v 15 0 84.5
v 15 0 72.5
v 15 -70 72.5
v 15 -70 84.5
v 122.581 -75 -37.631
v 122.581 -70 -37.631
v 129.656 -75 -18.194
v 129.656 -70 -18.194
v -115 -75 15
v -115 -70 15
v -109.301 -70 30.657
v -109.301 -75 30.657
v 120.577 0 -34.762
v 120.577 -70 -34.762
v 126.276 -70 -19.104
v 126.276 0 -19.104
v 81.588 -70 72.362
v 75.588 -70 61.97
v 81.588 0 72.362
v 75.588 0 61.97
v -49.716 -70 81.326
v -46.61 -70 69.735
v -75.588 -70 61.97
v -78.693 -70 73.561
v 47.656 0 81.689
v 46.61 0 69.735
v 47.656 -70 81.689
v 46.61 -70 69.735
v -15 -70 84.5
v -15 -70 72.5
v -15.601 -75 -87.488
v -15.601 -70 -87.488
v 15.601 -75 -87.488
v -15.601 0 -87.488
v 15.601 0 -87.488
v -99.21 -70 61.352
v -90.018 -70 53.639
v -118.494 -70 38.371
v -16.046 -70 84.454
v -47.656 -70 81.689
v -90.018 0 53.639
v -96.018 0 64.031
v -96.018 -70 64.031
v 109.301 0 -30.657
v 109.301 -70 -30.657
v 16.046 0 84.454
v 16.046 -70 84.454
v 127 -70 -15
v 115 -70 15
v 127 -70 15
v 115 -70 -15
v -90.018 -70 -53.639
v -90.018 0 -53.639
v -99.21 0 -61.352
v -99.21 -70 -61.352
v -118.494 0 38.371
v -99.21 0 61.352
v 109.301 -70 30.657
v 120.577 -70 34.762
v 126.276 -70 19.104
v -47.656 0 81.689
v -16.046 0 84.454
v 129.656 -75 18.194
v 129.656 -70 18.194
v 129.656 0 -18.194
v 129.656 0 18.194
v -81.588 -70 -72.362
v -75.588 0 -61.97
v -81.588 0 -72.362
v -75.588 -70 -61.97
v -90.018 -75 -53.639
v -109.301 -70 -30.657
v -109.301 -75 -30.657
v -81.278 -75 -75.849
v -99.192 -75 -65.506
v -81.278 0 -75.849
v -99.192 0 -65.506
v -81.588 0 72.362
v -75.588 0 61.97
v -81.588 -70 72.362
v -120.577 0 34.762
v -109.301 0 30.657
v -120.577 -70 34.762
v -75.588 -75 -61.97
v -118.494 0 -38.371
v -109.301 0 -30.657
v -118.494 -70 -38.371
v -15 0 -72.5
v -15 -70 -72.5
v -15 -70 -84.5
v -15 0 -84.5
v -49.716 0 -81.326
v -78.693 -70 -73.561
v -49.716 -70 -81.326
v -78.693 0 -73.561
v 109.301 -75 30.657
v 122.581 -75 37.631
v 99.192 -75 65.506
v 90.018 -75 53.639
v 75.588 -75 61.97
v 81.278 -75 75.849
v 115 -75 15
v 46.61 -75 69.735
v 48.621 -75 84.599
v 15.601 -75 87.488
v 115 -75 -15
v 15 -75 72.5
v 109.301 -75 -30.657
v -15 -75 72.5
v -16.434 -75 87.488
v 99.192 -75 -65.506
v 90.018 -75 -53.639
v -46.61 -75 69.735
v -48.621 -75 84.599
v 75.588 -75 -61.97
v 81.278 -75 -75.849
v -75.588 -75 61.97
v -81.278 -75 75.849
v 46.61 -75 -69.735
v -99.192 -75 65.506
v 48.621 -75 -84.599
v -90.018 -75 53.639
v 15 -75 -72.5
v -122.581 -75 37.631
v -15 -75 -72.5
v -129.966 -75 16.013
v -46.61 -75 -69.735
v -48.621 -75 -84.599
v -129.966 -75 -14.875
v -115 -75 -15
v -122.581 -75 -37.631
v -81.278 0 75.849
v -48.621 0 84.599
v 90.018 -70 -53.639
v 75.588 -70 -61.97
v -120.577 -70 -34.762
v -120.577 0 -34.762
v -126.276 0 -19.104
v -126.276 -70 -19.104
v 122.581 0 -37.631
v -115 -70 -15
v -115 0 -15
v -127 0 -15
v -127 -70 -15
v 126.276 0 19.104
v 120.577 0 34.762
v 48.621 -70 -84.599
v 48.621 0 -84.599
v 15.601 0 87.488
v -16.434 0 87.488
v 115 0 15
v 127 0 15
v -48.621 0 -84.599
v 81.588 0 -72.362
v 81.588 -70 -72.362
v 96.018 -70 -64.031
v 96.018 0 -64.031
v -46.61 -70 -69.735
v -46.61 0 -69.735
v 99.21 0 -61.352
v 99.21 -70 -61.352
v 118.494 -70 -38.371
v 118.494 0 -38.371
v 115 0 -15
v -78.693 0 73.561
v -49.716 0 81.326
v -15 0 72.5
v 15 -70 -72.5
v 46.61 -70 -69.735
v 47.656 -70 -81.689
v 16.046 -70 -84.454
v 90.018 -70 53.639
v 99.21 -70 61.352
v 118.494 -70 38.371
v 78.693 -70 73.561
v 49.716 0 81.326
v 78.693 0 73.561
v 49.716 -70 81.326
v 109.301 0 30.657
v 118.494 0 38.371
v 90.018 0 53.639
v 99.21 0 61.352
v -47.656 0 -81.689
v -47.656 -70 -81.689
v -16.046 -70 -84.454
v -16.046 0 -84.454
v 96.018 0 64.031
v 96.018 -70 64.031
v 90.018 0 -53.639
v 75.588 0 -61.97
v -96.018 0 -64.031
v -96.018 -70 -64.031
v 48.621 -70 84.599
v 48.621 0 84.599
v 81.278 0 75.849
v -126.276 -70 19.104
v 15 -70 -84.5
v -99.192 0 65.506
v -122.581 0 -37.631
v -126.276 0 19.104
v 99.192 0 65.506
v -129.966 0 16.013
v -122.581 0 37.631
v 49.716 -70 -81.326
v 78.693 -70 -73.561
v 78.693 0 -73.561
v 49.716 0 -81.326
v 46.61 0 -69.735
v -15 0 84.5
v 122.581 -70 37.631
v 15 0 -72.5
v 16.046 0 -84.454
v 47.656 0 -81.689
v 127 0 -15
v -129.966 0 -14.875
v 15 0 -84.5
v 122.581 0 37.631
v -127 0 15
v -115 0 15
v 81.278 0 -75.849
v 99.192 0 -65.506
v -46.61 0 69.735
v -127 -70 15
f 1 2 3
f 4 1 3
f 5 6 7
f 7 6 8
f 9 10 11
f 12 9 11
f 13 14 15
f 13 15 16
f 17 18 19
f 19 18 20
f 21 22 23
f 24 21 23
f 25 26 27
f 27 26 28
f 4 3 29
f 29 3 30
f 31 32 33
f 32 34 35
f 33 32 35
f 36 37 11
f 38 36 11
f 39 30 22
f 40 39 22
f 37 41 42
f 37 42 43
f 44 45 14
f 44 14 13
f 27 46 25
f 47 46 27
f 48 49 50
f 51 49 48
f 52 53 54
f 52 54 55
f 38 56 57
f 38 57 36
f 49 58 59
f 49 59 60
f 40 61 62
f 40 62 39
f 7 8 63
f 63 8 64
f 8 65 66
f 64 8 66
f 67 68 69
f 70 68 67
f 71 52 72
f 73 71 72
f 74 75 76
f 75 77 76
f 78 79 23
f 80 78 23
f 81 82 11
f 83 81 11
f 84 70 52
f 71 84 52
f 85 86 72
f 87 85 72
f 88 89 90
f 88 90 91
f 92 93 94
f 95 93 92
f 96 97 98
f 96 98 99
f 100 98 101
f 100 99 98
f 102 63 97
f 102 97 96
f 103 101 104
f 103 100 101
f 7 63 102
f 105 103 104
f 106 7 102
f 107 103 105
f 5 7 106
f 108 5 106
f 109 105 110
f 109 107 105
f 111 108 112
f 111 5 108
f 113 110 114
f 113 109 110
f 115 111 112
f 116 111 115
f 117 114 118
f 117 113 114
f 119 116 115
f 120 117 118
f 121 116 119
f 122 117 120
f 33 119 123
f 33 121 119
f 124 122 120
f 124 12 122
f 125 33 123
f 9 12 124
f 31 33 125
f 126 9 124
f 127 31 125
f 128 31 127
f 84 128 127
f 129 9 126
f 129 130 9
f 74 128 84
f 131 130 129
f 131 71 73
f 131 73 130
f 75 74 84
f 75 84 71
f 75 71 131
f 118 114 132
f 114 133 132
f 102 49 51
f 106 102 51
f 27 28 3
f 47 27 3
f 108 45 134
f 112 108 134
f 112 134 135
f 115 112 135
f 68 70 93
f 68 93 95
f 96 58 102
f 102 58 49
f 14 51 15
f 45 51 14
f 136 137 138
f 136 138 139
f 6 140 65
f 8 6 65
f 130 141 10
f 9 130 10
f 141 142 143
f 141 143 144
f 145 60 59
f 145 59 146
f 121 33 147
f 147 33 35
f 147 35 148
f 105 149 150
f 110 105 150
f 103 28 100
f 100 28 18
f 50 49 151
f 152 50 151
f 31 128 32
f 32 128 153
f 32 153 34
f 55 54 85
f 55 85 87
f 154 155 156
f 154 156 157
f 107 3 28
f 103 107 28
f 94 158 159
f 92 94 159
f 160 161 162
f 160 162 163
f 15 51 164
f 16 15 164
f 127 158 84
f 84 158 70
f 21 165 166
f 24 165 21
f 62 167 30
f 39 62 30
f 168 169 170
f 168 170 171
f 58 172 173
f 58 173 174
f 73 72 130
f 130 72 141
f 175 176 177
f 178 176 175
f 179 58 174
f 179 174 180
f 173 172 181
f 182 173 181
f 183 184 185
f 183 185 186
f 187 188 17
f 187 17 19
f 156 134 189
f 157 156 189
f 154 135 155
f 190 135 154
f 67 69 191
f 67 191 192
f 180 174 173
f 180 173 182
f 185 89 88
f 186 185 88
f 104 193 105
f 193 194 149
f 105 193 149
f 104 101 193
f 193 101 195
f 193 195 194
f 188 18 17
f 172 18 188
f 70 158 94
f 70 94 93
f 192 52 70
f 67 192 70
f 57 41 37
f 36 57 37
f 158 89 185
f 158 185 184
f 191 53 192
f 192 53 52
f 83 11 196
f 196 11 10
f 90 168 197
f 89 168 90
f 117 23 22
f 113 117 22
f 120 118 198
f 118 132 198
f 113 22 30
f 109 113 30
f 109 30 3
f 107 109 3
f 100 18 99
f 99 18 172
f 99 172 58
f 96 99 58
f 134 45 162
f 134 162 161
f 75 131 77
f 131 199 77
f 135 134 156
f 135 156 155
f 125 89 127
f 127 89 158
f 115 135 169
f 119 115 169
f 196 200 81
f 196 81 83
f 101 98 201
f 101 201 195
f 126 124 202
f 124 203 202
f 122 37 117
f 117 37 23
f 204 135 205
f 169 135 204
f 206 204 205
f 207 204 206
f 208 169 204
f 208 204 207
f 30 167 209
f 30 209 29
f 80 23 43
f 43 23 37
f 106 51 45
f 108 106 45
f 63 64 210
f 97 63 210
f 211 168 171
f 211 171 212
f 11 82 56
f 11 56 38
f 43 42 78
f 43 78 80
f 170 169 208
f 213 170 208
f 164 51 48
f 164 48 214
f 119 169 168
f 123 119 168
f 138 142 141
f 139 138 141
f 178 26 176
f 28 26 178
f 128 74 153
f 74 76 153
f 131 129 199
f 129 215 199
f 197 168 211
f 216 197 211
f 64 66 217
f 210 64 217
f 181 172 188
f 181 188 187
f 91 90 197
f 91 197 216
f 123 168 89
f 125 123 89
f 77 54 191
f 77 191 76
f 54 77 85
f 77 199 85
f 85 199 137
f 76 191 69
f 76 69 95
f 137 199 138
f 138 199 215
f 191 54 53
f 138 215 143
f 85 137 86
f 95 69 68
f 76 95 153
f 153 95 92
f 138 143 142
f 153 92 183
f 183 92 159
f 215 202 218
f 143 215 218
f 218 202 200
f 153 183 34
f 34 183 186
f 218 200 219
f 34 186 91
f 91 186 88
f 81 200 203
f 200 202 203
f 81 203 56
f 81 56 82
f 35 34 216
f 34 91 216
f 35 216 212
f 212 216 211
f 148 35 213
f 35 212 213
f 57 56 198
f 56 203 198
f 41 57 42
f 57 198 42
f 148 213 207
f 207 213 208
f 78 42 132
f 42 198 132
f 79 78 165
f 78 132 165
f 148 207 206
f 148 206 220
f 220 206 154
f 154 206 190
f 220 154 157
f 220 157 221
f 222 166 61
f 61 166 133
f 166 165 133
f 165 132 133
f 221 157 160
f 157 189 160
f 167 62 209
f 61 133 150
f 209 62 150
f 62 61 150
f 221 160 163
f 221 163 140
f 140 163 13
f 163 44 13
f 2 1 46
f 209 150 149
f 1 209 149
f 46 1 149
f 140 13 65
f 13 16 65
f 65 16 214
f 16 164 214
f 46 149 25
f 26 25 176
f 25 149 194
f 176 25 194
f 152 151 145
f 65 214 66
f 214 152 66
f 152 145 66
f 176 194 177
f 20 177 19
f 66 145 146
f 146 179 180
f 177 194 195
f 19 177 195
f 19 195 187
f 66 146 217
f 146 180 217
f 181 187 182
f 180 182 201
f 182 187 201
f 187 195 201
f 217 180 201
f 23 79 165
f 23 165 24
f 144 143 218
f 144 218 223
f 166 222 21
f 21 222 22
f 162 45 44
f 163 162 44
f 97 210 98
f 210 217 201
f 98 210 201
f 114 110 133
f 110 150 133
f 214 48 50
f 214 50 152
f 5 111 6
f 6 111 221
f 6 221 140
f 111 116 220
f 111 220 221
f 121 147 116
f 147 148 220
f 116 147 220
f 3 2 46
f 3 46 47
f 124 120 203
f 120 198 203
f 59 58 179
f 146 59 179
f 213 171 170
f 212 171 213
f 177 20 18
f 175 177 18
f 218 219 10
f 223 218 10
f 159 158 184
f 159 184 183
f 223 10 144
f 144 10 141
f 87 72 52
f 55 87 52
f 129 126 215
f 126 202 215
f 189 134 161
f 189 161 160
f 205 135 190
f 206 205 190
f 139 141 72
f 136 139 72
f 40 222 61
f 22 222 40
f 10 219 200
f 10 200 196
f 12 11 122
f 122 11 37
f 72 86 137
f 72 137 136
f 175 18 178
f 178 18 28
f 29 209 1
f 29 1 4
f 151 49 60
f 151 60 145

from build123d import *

# Parameters (mm, degrees)
PAD_DEPTH          = 70
PAD001_DEPTH       = 5
PAD001_FACE43_W    = 70
PAD001_FACE43_H    = 30
POCKET_DEPTH       = 12
POCKET_FACE41_W    = 70
POCKET_FACE41_H    = 31.7305168913
POCKET001_DEPTH    = 12
POCKET001_FACE44_W = 70
POCKET001_FACE44_H = 30
POCKET002_DEPTH    = 12
POCKET002_FACE47_W = 70
POCKET002_FACE47_H = 31.7305168913
POCKET003_DEPTH    = 12
POCKET003_FACE37_W = 70
POCKET003_FACE37_H = 16.6623057169
POCKET004_DEPTH    = 12
POCKET004_FACE36_W = 70
POCKET004_FACE36_H = 30
POCKET005_DEPTH    = 12
POCKET005_FACE35_W = 70
POCKET005_FACE35_H = 16.6623057169
POCKET006_DEPTH    = 12
POCKET006_FACE34_W = 70
POCKET006_FACE34_H = 30
POCKET007_DEPTH    = 12
POCKET007_FACE33_W = 70
POCKET007_FACE33_H = 16.6623057169
POCKET008_DEPTH    = 12
POCKET008_FACE60_W = 70
POCKET008_FACE60_H = 30
POCKET009_DEPTH    = 12
POCKET009_FACE63_W = 70
POCKET009_FACE63_H = 16.6623057169
POCKET010_DEPTH    = 12
POCKET010_FACE66_W = 70
POCKET010_FACE66_H = 30
POCKET011_DEPTH    = 12
POCKET011_FACE69_W = 70
POCKET011_FACE69_H = 16.6623057169
POCKET012_DEPTH    = 12
POCKET012_FACE72_W = 70
POCKET012_FACE72_H = 30
POCKET013_DEPTH    = 12
POCKET013_FACE75_W = 70
POCKET013_FACE75_H = 16.6623057169
POCKET014_DEPTH    = 12
POCKET014_FACE78_W = 70
POCKET014_FACE78_H = 30
POCKET015_DEPTH    = 12
POCKET015_FACE81_W = 70
POCKET015_FACE81_H = 16.6623057169
POCKET016_DEPTH    = 12
POCKET016_FACE84_W = 70
POCKET016_FACE84_H = 30
POCKET017_DEPTH    = 12
POCKET017_FACE87_W = 70
POCKET017_FACE87_H = 31.7305168913
POCKET018_DEPTH    = 12
POCKET018_FACE32_W = 70
POCKET018_FACE32_H = 30
POCKET019_DEPTH    = 12
POCKET019_FACE31_W = 70
POCKET019_FACE31_H = 16.6623057169
POCKET020_DEPTH    = 12
POCKET020_FACE30_W = 70
POCKET020_FACE30_H = 30
POCKET021_DEPTH    = 12
POCKET021_FACE29_W = 70
POCKET021_FACE29_H = 31.7305168913
POCKET022_DEPTH    = 12
POCKET022_FACE98_W = 70
POCKET022_FACE98_H = 30
POCKET023_DEPTH    = 12


with BuildPart() as part:
    # Sketch → Pad (new body)
    with BuildSketch(Plane.XZ):
        Polygon((15.6005336184, 87.4879738248), (-16.433599, 87.4879738248), (-48.6209968735, 84.5990576256), (-81.2780534486, 75.8486256891), (-99.1915759479, 65.506248652), (-122.5813887031, 37.6313552709), (-129.9657652325, 16.0128529043), (-129.9657652325, -14.874853), (-122.5813887031, -37.6313552709), (-99.1915759479, -65.506248652), (-81.2780534486, -75.8486256891), (-48.6209968735, -84.5990576256), (-15.6005336184, -87.4879738248), (15.6005336184, -87.4879738248), (48.6209968735, -84.5990576256), (81.2780534486, -75.8486256891), (99.1915759479, -65.506248652), (122.5813887031, -37.6313552709), (129.6559912563, -18.1940445045), (129.6559912563, 18.1940445045), (122.5813887031, 37.6313552709), (99.1915759479, 65.506248652), (81.2780534486, 75.8486256891), (48.6209968735, 84.5990576256), align=None)
        Polygon((-115, 15), (-115, -15), (-109.3011558106, -30.6574457275), (-90.01752752, -53.638779021), (-75.5875474835, -61.9699318795), (-46.6097726948, -69.7345032326), (-15, -72.5), (15, -72.5), (46.6097726948, -69.7345032326), (75.5875474835, -61.9699318795), (90.01752752, -53.638779021), (109.3011558106, -30.6574457275), (115, -15), (115, 15), (109.3011558106, 30.6574457275), (90.01752752, 53.638779021), (75.5875474835, 61.9699318795), (46.6097726948, 69.7345032326), (15, 72.5), (-15, 72.5), (-46.6097726948, 69.7345032326), (-75.5875474835, 61.9699318795), (-90.01752752, 53.638779021), (-109.3011558106, 30.6574457275), align=None, mode=Mode.SUBTRACT)
    extrude(amount=PAD_DEPTH)

    # Pad Face50 → Pad001 (add)
    with BuildSketch(Plane(origin=(0.0330089745, -70, 0.0202146999), x_dir=(-1, 0, 0), z_dir=(0, -1, 0))):
        Polygon((-15.5675246439, -87.4677591249), (16.4666079745, -87.4677591249), (48.654005848, -84.5788429257), (81.3110624231, -75.8284109892), (99.2245849224, -65.4860339521), (122.6143976776, -37.611140571), (129.998774207, -15.9926382044), (129.998774207, 14.8950676999), (122.6143976776, 37.6515699708), (99.2245849224, 65.5264633519), (81.3110624231, 75.868840389), (48.654005848, 84.6192723255), (15.633542593, 87.5081885247), (-15.5675246439, 87.5081885247), (-48.5879878989, 84.6192723255), (-81.2450444741, 75.868840389), (-99.1585669734, 65.5264633519), (-122.5483797286, 37.6515699708), (-129.6229822817, 18.2142592044), (-129.6229822817, -18.1738298046), (-122.5483797286, -37.611140571), (-99.1585669734, -65.4860339521), (-81.2450444741, -75.8284109892), (-48.5879878989, -84.5788429257), align=None)
        Polygon((15.0330089745, -72.4797853001), (-14.9669910255, -72.4797853001), (-46.5767637203, -69.7142885327), (-75.554538509, -61.9497171796), (-89.9845185454, -53.6185643211), (-109.268146836, -30.6372310276), (-114.9669910255, -14.9797853001), (-114.9669910255, 15.0202146999), (-109.268146836, 30.6776604274), (-89.9845185454, 53.6589937209), (-75.554538509, 61.9901465794), (-46.5767637203, 69.7547179325), (-14.9669910255, 72.5202146999), (15.0330089745, 72.5202146999), (46.6427816693, 69.7547179325), (75.620556458, 61.9901465794), (90.0505364945, 53.6589937209), (109.3341647851, 30.6776604274), (115.0330089745, 15.0202146999), (115.0330089745, -14.9797853001), (109.3341647851, -30.6372310276), (90.0505364945, -53.6185643211), (75.620556458, -61.9497171796), (46.6427816693, -69.7142885327), align=None, mode=Mode.SUBTRACT)
    extrude(amount=PAD001_DEPTH)

    # Pad001 Face43 → Pocket (cut)
    with BuildSketch(Plane(origin=(-61.0986600892, -35, -65.852217556), x_dir=(0, 1, 0), z_dir=(0.2588190451, 0, 0.9659258263))):
        Rectangle(PAD001_FACE43_W, PAD001_FACE43_H)
    extrude(amount=-POCKET_DEPTH, mode=Mode.SUBTRACT)

    # Pocket Face41 → Pocket001 (cut)
    with BuildSketch(Plane(origin=(-30.8048863474, -35, -71.1172516163), x_dir=(0, 1, 0), z_dir=(0.0871557427, 0, 0.9961946981))):
        Rectangle(POCKET_FACE41_W, POCKET_FACE41_H)
    extrude(amount=-POCKET001_DEPTH, mode=Mode.SUBTRACT)

    # Pocket001 Face44 → Pocket002 (cut)
    with BuildSketch(Plane(origin=(0, -35, -72.5), x_dir=(0, 1, 0), z_dir=(0, 0, 1))):
        Rectangle(POCKET001_FACE44_W, POCKET001_FACE44_H)
    extrude(amount=-POCKET002_DEPTH, mode=Mode.SUBTRACT)

    # Pocket002 Face47 → Pocket003 (cut)
    with BuildSketch(Plane(origin=(30.8048863474, -35, -71.1172516163), x_dir=(0, 1, 0), z_dir=(-0.0871557427, 0, 0.9961946981))):
        Rectangle(POCKET002_FACE47_W, POCKET002_FACE47_H)
    extrude(amount=-POCKET003_DEPTH, mode=Mode.SUBTRACT)

    # Pocket003 Face37 → Pocket004 (cut)
    with BuildSketch(Plane(origin=(-82.8025375017, -35, -57.8043554503), x_dir=(0, -1, 0), z_dir=(0.5, 0, 0.8660254038))):
        Rectangle(POCKET003_FACE37_W, POCKET003_FACE37_H)
    extrude(amount=-POCKET004_DEPTH, mode=Mode.SUBTRACT)

    # Pocket004 Face36 → Pocket005 (cut)
    with BuildSketch(Plane(origin=(-99.6593416653, -35, -42.1481123743), x_dir=(0, -1, 0), z_dir=(0.7660444431, 0, 0.6427876097))):
        Rectangle(POCKET004_FACE36_W, POCKET004_FACE36_H)
    extrude(amount=-POCKET005_DEPTH, mode=Mode.SUBTRACT)

    # Pocket005 Face35 → Pocket006 (cut)
    with BuildSketch(Plane(origin=(-112.1505779053, -35, -22.8287228637), x_dir=(0, -1, 0), z_dir=(0.9396926208, 0, 0.3420201433))):
        Rectangle(POCKET005_FACE35_W, POCKET005_FACE35_H)
    extrude(amount=-POCKET006_DEPTH, mode=Mode.SUBTRACT)

    # Pocket006 Face34 → Pocket007 (cut)
    with BuildSketch(Plane(origin=(-115, -35, 0), x_dir=(0, -1, 0), z_dir=(1, 0, 0))):
        Rectangle(POCKET006_FACE34_W, POCKET006_FACE34_H)
    extrude(amount=-POCKET007_DEPTH, mode=Mode.SUBTRACT)

    # Pocket007 Face33 → Pocket008 (cut)
    with BuildSketch(Plane(origin=(-112.1505779053, -35, 22.8287228637), x_dir=(0, -1, 0), z_dir=(0.9396926208, 0, -0.3420201433))):
        Rectangle(POCKET007_FACE33_W, POCKET007_FACE33_H)
    extrude(amount=-POCKET008_DEPTH, mode=Mode.SUBTRACT)

    # Pocket008 Face60 → Pocket009 (cut)
    with BuildSketch(Plane(origin=(61.0986600892, -35, -65.852217556), x_dir=(0, 1, 0), z_dir=(-0.2588190451, 0, 0.9659258263))):
        Rectangle(POCKET008_FACE60_W, POCKET008_FACE60_H)
    extrude(amount=-POCKET009_DEPTH, mode=Mode.SUBTRACT)

    # Pocket009 Face63 → Pocket010 (cut)
    with BuildSketch(Plane(origin=(82.8025375017, -35, -57.8043554503), x_dir=(0, 1, 0), z_dir=(-0.5, 0, 0.8660254038))):
        Rectangle(POCKET009_FACE63_W, POCKET009_FACE63_H)
    extrude(amount=-POCKET010_DEPTH, mode=Mode.SUBTRACT)

    # Pocket010 Face66 → Pocket011 (cut)
    with BuildSketch(Plane(origin=(99.6593416653, -35, -42.1481123743), x_dir=(0, 1, 0), z_dir=(-0.7660444431, 0, 0.6427876097))):
        Rectangle(POCKET010_FACE66_W, POCKET010_FACE66_H)
    extrude(amount=-POCKET011_DEPTH, mode=Mode.SUBTRACT)

    # Pocket011 Face69 → Pocket012 (cut)
    with BuildSketch(Plane(origin=(112.1505779053, -35, -22.8287228637), x_dir=(0, 1, 0), z_dir=(-0.9396926208, 0, 0.3420201433))):
        Rectangle(POCKET011_FACE69_W, POCKET011_FACE69_H)
    extrude(amount=-POCKET012_DEPTH, mode=Mode.SUBTRACT)

    # Pocket012 Face72 → Pocket013 (cut)
    with BuildSketch(Plane(origin=(115, -35, 0), x_dir=(0, 1, 0), z_dir=(-1, 0, 0))):
        Rectangle(POCKET012_FACE72_W, POCKET012_FACE72_H)
    extrude(amount=-POCKET013_DEPTH, mode=Mode.SUBTRACT)

    # Pocket013 Face75 → Pocket014 (cut)
    with BuildSketch(Plane(origin=(112.1505779053, -35, 22.8287228637), x_dir=(0, 1, 0), z_dir=(-0.9396926208, 0, -0.3420201433))):
        Rectangle(POCKET013_FACE75_W, POCKET013_FACE75_H)
    extrude(amount=-POCKET014_DEPTH, mode=Mode.SUBTRACT)

    # Pocket014 Face78 → Pocket015 (cut)
    with BuildSketch(Plane(origin=(99.6593416653, -35, 42.1481123743), x_dir=(0, 1, 0), z_dir=(-0.7660444431, 0, -0.6427876097))):
        Rectangle(POCKET014_FACE78_W, POCKET014_FACE78_H)
    extrude(amount=-POCKET015_DEPTH, mode=Mode.SUBTRACT)

    # Pocket015 Face81 → Pocket016 (cut)
    with BuildSketch(Plane(origin=(82.8025375017, -35, 57.8043554503), x_dir=(0, 1, 0), z_dir=(-0.5, 0, -0.8660254038))):
        Rectangle(POCKET015_FACE81_W, POCKET015_FACE81_H)
    extrude(amount=-POCKET016_DEPTH, mode=Mode.SUBTRACT)

    # Pocket016 Face84 → Pocket017 (cut)
    with BuildSketch(Plane(origin=(61.0986600892, -35, 65.852217556), x_dir=(0, -1, 0), z_dir=(-0.2588190451, 0, -0.9659258263))):
        Rectangle(POCKET016_FACE84_W, POCKET016_FACE84_H)
    extrude(amount=-POCKET017_DEPTH, mode=Mode.SUBTRACT)

    # Pocket017 Face87 → Pocket018 (cut)
    with BuildSketch(Plane(origin=(30.8048863474, -35, 71.1172516163), x_dir=(0, -1, 0), z_dir=(-0.0871557427, 0, -0.9961946981))):
        Rectangle(POCKET017_FACE87_W, POCKET017_FACE87_H)
    extrude(amount=-POCKET018_DEPTH, mode=Mode.SUBTRACT)

    # Pocket018 Face32 → Pocket019 (cut)
    with BuildSketch(Plane(origin=(-99.6593416653, -35, 42.1481123743), x_dir=(0, -1, 0), z_dir=(0.7660444431, 0, -0.6427876097))):
        Rectangle(POCKET018_FACE32_W, POCKET018_FACE32_H)
    extrude(amount=-POCKET019_DEPTH, mode=Mode.SUBTRACT)

    # Pocket019 Face31 → Pocket020 (cut)
    with BuildSketch(Plane(origin=(-82.8025375017, -35, 57.8043554503), x_dir=(0, -1, 0), z_dir=(0.5, 0, -0.8660254038))):
        Rectangle(POCKET019_FACE31_W, POCKET019_FACE31_H)
    extrude(amount=-POCKET020_DEPTH, mode=Mode.SUBTRACT)

    # Pocket020 Face30 → Pocket021 (cut)
    with BuildSketch(Plane(origin=(-61.0986600892, -35, 65.852217556), x_dir=(0, -1, 0), z_dir=(0.2588190451, 0, -0.9659258263))):
        Rectangle(POCKET020_FACE30_W, POCKET020_FACE30_H)
    extrude(amount=-POCKET021_DEPTH, mode=Mode.SUBTRACT)

    # Pocket021 Face29 → Pocket022 (cut)
    with BuildSketch(Plane(origin=(-30.8048863474, -35, 71.1172516163), x_dir=(0, -1, 0), z_dir=(0.0871557427, 0, -0.9961946981))):
        Rectangle(POCKET021_FACE29_W, POCKET021_FACE29_H)
    extrude(amount=-POCKET022_DEPTH, mode=Mode.SUBTRACT)

    # Pocket022 Face98 → Pocket023 (cut)
    with BuildSketch(Plane(origin=(0, -35, 72.5), x_dir=(0, -1, 0), z_dir=(0, 0, -1))):
        Rectangle(POCKET022_FACE98_W, POCKET022_FACE98_H)
    extrude(amount=-POCKET023_DEPTH, mode=Mode.SUBTRACT)


solid = part.part
